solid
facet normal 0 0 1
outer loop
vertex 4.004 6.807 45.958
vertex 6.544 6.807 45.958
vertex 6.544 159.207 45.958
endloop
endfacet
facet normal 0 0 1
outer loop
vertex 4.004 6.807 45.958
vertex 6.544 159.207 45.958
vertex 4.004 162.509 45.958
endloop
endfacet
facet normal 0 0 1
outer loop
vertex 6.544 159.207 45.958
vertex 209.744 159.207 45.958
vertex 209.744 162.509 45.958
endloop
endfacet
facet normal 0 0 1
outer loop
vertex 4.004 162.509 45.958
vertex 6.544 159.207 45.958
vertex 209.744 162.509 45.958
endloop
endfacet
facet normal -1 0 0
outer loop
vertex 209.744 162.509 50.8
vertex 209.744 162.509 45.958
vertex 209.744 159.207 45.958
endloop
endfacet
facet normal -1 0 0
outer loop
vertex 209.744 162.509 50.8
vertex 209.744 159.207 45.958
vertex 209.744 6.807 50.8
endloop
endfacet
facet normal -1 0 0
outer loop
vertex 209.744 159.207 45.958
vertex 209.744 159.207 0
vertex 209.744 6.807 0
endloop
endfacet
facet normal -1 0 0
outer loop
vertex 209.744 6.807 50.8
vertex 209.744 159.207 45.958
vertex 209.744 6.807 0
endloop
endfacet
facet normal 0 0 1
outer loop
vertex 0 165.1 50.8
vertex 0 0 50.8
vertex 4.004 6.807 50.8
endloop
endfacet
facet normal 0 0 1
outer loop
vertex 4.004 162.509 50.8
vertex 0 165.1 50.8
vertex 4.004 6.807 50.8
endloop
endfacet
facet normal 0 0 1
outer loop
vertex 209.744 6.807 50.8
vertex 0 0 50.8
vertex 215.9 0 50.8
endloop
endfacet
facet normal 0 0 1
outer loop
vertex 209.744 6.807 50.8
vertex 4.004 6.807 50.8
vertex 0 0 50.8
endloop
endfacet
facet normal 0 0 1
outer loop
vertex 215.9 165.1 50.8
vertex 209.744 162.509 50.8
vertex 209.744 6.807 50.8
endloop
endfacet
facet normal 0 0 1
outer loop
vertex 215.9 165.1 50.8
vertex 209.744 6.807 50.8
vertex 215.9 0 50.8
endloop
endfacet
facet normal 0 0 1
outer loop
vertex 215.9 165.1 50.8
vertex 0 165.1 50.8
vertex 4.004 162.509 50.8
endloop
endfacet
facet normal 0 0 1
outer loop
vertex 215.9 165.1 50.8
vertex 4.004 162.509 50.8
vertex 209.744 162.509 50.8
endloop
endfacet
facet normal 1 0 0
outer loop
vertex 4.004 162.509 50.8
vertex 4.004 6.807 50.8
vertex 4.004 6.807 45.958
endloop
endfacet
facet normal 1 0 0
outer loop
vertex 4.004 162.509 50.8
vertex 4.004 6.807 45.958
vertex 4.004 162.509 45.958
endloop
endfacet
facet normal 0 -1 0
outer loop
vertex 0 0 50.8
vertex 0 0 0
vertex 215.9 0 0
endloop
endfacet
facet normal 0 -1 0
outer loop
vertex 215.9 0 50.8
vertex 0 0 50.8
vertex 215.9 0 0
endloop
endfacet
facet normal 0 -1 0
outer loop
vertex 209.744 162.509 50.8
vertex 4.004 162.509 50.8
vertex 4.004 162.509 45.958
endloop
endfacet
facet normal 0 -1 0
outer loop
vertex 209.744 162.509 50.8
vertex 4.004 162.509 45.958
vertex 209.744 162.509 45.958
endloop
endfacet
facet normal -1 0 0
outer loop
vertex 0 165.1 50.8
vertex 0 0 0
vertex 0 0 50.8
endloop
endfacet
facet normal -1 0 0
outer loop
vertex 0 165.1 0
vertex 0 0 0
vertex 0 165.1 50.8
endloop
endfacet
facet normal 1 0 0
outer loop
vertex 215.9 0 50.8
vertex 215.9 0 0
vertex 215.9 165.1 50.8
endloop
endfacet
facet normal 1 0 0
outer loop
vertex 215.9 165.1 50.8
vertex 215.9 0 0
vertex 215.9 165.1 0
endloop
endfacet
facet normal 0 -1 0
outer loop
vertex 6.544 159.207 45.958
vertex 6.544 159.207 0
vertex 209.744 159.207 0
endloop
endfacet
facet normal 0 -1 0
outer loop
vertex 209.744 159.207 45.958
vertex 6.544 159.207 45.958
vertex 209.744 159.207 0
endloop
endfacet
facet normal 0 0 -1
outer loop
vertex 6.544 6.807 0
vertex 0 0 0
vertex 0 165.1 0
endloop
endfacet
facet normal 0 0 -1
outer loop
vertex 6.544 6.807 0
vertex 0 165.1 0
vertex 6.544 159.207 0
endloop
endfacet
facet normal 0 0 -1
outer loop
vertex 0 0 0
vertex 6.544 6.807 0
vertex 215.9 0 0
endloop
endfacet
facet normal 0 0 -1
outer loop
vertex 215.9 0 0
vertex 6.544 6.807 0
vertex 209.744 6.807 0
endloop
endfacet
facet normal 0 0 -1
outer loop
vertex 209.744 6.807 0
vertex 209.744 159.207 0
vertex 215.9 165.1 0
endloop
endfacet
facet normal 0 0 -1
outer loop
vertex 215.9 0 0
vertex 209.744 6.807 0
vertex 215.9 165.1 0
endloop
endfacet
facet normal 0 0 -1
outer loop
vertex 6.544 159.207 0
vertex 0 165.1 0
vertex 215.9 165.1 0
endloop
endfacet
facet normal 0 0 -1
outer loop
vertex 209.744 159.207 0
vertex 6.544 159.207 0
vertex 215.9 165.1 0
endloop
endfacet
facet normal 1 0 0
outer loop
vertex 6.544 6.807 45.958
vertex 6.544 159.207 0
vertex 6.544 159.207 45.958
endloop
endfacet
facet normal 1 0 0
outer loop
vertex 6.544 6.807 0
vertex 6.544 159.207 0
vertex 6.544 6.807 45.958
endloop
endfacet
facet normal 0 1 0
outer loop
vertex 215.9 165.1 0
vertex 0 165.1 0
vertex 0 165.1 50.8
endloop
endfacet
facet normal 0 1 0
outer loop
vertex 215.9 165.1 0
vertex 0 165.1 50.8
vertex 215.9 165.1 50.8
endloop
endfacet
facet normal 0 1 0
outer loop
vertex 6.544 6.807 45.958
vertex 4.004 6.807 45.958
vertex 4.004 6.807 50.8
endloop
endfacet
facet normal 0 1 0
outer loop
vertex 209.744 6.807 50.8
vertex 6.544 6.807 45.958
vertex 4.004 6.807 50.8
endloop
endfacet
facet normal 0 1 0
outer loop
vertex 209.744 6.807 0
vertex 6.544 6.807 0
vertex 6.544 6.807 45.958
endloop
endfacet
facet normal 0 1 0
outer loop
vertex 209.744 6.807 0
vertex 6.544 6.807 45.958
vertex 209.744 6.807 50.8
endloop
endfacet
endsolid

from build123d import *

# Parameters (mm, degrees)
F0_W     = 215.9
F0_H     = 165.1
F1_DEPTH = 50.8
F2_W     = 203.2
F2_H     = 152.4
F3_DEPTH = 50.8
F4_W     = 152.4
F4_H     = 4.8418088436
F5_DEPTH = 2.54
F6_W     = 205.74
F6_H     = 4.8418088436
F7_DEPTH = 3.302


with BuildPart() as f1:
    # F0 (on Top) → F1 (new body)
    with BuildSketch(Plane.XY):
        with Locations((107.95, 82.55)):
            Rectangle(F0_W, F0_H)
    extrude(amount=F1_DEPTH)

    # F2 (on face) → F3 (cut)
    with BuildSketch(Plane(origin=(0, 0, 0), x_dir=(1, 0, 0), z_dir=(0, 0, -1))):
        with Locations((108.1436636686, -83.0071964197)):
            Rectangle(F2_W, F2_H)
    extrude(amount=-F3_DEPTH, mode=Mode.SUBTRACT)

    # F4 (on face) → F5 (cut)
    with BuildSketch(Plane.YZ.offset(6.5436636686)):
        with Locations((83.0071964197, 48.3790955782)):
            Rectangle(F4_W, F4_H)
    extrude(amount=-F5_DEPTH, mode=Mode.SUBTRACT)

    # F6 (on face) → F7 (cut)
    with BuildSketch(Plane.XZ.offset(-159.2071964197)):
        with Locations((106.8736636686, 48.3790955782)):
            Rectangle(F6_W, F6_H)
    extrude(amount=-F7_DEPTH, mode=Mode.SUBTRACT)


solid = f1.part
